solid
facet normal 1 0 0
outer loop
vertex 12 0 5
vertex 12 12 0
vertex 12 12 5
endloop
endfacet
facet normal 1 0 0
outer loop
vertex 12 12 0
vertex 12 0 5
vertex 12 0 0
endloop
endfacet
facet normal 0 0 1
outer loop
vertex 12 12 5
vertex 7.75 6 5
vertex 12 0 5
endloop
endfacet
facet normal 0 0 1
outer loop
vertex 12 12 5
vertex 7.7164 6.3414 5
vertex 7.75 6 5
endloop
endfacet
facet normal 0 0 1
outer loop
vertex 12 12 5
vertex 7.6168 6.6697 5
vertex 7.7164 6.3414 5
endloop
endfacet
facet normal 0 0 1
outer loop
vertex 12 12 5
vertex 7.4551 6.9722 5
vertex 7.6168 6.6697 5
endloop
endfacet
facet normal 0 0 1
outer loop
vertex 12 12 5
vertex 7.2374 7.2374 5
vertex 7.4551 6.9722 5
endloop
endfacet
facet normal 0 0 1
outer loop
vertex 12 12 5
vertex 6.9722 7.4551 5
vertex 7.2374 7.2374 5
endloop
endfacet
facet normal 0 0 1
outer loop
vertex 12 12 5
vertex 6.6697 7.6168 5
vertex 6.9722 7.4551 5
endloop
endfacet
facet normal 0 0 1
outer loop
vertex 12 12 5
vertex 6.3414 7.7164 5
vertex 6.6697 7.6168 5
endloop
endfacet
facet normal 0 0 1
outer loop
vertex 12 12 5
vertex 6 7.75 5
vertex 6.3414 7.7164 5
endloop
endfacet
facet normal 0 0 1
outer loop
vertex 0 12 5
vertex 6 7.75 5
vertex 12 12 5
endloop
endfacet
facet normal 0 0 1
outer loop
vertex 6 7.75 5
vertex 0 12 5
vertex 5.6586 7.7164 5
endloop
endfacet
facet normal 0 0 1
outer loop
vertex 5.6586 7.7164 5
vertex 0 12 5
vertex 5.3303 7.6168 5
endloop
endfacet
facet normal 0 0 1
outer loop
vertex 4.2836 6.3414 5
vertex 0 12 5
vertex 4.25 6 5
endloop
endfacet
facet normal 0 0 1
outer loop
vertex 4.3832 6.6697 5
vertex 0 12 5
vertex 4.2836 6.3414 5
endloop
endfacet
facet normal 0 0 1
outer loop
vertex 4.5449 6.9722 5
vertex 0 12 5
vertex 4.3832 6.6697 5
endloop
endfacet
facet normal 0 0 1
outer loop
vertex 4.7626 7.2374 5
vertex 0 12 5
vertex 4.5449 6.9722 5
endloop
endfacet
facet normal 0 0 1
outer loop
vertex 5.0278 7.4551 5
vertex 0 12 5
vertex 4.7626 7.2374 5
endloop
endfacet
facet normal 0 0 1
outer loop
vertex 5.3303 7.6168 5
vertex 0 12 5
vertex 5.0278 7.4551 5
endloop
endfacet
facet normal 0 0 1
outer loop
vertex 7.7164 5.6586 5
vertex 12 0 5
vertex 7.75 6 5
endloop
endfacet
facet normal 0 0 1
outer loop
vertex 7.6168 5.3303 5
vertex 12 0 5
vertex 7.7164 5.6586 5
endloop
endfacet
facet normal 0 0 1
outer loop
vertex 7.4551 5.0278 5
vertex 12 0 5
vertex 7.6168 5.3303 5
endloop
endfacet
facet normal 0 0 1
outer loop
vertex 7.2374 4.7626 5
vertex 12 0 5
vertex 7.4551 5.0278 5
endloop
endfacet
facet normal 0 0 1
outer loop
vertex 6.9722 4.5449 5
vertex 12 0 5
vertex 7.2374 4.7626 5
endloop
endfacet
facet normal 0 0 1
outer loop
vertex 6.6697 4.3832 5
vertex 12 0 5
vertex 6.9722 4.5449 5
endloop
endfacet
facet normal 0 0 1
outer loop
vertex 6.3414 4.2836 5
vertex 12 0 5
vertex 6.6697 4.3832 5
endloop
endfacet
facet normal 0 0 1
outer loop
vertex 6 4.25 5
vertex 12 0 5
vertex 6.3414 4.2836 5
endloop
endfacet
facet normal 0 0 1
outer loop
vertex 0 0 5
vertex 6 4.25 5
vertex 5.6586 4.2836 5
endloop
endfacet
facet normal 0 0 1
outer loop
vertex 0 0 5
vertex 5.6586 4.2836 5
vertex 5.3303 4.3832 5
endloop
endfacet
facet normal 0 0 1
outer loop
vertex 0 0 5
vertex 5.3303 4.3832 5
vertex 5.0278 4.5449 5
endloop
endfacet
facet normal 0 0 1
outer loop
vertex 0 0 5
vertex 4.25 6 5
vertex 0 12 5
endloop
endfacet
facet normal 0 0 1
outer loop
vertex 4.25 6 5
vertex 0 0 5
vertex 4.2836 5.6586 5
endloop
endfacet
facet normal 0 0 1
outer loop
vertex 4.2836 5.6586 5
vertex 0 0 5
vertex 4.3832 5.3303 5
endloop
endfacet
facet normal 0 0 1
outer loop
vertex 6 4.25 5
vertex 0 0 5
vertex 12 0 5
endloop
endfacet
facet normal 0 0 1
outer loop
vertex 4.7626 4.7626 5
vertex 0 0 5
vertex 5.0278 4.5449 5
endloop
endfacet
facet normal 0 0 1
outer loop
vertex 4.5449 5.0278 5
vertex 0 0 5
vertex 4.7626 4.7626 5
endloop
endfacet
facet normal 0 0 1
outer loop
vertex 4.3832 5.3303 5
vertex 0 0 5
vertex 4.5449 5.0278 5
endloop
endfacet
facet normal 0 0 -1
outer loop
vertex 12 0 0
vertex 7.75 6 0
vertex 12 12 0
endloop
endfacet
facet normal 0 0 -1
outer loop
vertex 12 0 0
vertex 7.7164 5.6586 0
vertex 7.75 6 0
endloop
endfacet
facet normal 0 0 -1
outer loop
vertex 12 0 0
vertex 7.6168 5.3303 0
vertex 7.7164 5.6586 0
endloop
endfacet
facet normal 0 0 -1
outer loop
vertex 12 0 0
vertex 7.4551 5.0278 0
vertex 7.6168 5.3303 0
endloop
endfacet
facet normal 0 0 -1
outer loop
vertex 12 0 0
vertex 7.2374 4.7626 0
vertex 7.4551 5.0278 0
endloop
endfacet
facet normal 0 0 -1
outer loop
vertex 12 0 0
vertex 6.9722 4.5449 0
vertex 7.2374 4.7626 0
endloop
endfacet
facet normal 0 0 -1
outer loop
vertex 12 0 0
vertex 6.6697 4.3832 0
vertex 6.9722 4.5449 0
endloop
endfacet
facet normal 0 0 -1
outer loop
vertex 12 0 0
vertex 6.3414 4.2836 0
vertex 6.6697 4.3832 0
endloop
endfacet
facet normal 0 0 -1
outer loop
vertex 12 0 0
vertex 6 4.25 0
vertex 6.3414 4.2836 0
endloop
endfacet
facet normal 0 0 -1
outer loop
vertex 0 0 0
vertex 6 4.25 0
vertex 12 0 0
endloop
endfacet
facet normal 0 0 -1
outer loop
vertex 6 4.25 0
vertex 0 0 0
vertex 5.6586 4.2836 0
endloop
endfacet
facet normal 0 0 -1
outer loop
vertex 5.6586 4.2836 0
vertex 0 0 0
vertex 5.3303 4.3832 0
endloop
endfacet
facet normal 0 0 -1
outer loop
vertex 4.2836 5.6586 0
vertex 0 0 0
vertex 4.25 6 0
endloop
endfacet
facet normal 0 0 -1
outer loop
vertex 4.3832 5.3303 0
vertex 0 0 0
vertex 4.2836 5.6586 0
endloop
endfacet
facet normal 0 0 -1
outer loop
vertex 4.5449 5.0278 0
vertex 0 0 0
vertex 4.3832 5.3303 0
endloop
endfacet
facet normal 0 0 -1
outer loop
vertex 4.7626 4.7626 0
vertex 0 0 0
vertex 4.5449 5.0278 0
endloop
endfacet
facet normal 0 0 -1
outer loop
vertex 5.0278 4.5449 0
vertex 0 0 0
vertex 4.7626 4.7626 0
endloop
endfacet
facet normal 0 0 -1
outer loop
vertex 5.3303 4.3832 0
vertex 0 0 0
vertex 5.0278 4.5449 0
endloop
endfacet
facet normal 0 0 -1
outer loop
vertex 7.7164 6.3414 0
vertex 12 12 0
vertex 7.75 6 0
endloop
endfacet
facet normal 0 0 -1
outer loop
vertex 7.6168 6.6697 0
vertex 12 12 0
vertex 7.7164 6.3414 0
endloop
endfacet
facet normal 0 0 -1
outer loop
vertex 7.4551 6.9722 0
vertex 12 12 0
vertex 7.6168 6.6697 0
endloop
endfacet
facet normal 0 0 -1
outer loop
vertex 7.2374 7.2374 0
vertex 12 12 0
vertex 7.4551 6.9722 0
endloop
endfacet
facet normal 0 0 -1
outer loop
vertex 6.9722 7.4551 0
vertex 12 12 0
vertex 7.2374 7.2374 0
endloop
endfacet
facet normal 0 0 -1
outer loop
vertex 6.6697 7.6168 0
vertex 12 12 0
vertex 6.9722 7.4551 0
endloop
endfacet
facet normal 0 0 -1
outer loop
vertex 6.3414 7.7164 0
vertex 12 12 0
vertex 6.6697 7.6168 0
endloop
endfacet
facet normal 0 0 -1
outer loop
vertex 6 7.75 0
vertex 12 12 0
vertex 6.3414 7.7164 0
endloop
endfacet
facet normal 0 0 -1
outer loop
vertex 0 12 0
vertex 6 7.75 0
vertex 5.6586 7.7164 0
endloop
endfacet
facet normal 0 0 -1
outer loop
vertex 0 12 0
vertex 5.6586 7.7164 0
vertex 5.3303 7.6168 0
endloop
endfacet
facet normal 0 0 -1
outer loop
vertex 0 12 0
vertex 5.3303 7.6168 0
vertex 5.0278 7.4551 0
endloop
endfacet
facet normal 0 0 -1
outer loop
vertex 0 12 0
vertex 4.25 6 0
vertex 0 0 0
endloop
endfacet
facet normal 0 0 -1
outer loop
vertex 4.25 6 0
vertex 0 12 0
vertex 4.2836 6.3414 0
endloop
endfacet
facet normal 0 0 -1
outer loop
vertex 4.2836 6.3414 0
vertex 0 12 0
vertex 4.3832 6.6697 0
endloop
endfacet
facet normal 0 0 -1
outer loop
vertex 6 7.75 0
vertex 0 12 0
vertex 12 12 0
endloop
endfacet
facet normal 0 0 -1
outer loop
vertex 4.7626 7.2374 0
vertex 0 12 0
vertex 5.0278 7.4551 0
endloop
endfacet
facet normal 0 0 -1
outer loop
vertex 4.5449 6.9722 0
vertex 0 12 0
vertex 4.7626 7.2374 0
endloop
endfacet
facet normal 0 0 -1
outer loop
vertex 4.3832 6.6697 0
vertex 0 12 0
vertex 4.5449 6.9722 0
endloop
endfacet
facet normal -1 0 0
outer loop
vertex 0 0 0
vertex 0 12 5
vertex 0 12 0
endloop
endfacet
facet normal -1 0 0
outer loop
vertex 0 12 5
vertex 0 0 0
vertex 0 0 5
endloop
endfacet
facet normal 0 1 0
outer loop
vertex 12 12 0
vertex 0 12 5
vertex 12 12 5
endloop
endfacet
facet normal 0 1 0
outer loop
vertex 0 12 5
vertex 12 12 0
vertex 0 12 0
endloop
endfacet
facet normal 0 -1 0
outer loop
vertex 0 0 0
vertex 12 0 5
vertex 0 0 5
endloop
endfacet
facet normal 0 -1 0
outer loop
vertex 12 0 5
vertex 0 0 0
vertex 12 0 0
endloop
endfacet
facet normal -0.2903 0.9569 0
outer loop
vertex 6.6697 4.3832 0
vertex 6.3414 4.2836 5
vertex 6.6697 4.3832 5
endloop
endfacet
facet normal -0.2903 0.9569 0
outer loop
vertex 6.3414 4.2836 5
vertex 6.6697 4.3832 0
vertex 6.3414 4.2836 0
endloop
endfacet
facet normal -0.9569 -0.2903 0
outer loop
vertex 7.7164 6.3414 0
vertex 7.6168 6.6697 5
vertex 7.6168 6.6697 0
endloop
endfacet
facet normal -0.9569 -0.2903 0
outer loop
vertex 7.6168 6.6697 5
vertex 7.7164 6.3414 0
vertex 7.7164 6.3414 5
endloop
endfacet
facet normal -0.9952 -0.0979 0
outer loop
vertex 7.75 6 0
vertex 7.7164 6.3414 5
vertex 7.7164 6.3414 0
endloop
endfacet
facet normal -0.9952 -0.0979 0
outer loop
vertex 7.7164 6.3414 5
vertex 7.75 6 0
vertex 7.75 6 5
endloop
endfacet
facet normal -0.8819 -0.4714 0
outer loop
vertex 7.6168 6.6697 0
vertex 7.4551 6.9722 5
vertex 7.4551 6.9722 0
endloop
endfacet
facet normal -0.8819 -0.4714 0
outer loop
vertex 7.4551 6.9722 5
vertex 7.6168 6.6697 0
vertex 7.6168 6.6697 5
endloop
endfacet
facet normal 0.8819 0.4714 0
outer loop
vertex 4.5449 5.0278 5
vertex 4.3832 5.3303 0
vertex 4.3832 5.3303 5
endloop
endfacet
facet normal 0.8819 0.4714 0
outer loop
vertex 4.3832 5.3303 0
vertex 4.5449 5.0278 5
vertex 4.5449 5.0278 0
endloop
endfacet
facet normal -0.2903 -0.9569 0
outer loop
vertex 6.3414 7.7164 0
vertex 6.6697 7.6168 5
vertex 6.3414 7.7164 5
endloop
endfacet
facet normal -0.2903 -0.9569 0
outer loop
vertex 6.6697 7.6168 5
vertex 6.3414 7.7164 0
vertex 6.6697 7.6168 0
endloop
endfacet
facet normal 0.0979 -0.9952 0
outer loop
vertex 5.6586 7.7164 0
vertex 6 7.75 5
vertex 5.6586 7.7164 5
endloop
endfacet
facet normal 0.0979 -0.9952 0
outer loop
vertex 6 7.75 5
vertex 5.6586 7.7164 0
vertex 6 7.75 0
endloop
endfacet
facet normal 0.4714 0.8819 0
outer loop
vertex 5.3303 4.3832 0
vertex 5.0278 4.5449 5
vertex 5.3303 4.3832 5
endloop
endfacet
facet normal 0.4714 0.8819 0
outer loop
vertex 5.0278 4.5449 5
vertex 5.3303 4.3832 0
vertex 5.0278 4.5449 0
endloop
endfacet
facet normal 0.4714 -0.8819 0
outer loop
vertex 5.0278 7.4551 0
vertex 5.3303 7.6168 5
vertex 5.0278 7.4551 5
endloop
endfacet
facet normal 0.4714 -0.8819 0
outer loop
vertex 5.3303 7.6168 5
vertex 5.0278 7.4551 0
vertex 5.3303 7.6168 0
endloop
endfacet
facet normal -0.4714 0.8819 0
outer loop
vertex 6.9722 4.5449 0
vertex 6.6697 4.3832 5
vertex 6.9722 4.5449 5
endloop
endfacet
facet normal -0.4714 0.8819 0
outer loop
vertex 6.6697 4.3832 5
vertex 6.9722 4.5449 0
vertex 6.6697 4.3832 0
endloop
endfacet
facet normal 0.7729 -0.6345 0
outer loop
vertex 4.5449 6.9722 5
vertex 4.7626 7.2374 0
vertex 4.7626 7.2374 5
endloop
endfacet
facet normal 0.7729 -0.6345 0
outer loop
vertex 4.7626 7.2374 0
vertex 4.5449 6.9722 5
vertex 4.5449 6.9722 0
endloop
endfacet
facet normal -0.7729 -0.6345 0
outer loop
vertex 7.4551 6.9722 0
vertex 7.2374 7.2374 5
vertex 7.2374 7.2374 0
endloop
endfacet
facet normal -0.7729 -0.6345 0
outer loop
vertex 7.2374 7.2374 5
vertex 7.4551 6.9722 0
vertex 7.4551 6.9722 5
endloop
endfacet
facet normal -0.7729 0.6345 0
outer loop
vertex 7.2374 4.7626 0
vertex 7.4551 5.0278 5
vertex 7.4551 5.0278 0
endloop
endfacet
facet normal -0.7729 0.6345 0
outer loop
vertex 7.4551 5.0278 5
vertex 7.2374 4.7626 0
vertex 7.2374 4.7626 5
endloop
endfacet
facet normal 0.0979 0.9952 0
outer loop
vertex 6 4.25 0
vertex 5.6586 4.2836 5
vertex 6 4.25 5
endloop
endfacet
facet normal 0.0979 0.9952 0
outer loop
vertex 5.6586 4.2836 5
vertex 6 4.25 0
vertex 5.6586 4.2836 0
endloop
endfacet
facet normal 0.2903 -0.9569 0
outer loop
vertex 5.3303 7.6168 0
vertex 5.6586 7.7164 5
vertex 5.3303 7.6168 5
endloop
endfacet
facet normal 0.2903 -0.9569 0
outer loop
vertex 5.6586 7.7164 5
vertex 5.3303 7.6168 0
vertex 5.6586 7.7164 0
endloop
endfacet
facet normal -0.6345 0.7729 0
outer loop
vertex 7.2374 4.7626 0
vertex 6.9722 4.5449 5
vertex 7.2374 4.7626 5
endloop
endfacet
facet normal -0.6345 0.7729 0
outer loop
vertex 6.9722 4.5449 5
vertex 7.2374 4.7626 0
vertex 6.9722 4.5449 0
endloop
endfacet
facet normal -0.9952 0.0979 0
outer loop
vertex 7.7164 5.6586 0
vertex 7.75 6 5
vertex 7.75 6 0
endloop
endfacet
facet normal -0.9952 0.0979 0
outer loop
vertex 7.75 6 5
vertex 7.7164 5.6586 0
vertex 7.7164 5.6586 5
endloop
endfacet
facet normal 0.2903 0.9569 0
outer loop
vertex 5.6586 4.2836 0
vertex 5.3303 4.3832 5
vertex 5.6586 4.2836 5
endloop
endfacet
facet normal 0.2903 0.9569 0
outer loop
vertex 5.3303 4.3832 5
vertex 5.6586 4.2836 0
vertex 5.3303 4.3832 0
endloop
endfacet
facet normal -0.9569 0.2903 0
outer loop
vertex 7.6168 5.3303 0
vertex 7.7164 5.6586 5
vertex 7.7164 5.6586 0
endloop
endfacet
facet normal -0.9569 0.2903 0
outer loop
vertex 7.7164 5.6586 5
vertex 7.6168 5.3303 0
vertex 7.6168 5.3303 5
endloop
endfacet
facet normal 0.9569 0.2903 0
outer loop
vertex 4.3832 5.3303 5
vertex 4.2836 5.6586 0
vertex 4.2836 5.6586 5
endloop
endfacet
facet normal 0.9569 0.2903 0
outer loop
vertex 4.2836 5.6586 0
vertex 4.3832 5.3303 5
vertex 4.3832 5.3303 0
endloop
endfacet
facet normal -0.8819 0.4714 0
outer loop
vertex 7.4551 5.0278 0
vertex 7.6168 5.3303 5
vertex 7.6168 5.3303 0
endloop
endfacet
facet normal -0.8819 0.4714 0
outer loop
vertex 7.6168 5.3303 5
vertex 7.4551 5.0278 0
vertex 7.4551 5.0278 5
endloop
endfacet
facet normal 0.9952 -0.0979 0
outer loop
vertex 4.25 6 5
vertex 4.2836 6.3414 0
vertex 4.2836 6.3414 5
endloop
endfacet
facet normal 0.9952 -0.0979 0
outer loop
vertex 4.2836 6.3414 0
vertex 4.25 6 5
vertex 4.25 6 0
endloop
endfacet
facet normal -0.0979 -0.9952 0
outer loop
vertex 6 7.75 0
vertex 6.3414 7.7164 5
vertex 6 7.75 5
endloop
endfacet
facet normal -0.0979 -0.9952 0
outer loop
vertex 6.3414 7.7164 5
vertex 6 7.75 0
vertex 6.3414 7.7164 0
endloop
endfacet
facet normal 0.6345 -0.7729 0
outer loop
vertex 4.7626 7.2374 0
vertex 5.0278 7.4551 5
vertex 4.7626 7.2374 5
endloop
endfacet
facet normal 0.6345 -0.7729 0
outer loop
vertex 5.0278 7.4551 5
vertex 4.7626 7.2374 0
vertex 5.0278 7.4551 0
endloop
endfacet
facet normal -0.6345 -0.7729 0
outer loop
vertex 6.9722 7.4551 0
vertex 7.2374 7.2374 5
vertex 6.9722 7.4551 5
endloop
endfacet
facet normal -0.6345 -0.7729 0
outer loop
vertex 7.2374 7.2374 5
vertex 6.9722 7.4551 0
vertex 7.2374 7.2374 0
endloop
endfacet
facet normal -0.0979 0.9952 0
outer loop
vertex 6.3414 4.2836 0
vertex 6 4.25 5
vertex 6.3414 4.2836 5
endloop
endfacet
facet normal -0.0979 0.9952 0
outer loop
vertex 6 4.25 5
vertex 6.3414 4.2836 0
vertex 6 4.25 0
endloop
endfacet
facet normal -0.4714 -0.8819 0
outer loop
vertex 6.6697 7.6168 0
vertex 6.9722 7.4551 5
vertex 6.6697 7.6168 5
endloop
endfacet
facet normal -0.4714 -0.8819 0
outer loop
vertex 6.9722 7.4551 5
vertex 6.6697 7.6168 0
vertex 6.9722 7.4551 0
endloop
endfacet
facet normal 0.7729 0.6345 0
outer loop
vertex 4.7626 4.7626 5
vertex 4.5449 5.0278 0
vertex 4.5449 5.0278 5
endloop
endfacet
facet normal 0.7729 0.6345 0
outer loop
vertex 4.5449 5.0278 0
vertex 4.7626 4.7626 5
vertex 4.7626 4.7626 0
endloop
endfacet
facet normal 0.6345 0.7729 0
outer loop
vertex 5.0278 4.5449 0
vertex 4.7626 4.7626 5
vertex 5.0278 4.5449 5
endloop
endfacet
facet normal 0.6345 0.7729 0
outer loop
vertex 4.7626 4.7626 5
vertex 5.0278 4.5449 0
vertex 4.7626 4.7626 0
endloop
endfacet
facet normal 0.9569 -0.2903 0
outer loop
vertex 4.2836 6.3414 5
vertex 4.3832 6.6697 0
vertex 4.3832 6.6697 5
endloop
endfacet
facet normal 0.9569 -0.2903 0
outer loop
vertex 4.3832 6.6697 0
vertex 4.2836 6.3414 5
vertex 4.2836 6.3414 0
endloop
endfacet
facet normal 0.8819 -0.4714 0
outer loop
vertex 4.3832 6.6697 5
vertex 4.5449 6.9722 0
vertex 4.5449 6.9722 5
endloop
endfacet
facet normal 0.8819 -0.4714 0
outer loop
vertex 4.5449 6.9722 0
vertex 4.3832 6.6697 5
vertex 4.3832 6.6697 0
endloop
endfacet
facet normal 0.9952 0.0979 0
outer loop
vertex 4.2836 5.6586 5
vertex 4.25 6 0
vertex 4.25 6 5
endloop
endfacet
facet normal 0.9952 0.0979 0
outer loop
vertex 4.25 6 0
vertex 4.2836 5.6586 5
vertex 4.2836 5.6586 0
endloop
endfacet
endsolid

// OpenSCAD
$fn = 32;

// ----------------------------------------------------------------------
// Micro pad: drilled pad, 5-20 mm class
// ----------------------------------------------------------------------

// --- parameters (mm) ---
pad_l = 12;               // pad length, X
pad_w = 12;               // pad width, Y
pad_t = 5;                // pad thickness, Z
hole_d = 3.5;             // through hole diameter
fit_tol = 0.1;            // tolerance for press fits, mm
free_tol = 0.5;           // tolerance for clearance fits, mm

difference() {
  cube([pad_l, pad_w, pad_t]);
  translate([pad_l / 2, pad_w / 2, -1])
    cylinder(h = pad_t + 2, d = hole_d);
}
